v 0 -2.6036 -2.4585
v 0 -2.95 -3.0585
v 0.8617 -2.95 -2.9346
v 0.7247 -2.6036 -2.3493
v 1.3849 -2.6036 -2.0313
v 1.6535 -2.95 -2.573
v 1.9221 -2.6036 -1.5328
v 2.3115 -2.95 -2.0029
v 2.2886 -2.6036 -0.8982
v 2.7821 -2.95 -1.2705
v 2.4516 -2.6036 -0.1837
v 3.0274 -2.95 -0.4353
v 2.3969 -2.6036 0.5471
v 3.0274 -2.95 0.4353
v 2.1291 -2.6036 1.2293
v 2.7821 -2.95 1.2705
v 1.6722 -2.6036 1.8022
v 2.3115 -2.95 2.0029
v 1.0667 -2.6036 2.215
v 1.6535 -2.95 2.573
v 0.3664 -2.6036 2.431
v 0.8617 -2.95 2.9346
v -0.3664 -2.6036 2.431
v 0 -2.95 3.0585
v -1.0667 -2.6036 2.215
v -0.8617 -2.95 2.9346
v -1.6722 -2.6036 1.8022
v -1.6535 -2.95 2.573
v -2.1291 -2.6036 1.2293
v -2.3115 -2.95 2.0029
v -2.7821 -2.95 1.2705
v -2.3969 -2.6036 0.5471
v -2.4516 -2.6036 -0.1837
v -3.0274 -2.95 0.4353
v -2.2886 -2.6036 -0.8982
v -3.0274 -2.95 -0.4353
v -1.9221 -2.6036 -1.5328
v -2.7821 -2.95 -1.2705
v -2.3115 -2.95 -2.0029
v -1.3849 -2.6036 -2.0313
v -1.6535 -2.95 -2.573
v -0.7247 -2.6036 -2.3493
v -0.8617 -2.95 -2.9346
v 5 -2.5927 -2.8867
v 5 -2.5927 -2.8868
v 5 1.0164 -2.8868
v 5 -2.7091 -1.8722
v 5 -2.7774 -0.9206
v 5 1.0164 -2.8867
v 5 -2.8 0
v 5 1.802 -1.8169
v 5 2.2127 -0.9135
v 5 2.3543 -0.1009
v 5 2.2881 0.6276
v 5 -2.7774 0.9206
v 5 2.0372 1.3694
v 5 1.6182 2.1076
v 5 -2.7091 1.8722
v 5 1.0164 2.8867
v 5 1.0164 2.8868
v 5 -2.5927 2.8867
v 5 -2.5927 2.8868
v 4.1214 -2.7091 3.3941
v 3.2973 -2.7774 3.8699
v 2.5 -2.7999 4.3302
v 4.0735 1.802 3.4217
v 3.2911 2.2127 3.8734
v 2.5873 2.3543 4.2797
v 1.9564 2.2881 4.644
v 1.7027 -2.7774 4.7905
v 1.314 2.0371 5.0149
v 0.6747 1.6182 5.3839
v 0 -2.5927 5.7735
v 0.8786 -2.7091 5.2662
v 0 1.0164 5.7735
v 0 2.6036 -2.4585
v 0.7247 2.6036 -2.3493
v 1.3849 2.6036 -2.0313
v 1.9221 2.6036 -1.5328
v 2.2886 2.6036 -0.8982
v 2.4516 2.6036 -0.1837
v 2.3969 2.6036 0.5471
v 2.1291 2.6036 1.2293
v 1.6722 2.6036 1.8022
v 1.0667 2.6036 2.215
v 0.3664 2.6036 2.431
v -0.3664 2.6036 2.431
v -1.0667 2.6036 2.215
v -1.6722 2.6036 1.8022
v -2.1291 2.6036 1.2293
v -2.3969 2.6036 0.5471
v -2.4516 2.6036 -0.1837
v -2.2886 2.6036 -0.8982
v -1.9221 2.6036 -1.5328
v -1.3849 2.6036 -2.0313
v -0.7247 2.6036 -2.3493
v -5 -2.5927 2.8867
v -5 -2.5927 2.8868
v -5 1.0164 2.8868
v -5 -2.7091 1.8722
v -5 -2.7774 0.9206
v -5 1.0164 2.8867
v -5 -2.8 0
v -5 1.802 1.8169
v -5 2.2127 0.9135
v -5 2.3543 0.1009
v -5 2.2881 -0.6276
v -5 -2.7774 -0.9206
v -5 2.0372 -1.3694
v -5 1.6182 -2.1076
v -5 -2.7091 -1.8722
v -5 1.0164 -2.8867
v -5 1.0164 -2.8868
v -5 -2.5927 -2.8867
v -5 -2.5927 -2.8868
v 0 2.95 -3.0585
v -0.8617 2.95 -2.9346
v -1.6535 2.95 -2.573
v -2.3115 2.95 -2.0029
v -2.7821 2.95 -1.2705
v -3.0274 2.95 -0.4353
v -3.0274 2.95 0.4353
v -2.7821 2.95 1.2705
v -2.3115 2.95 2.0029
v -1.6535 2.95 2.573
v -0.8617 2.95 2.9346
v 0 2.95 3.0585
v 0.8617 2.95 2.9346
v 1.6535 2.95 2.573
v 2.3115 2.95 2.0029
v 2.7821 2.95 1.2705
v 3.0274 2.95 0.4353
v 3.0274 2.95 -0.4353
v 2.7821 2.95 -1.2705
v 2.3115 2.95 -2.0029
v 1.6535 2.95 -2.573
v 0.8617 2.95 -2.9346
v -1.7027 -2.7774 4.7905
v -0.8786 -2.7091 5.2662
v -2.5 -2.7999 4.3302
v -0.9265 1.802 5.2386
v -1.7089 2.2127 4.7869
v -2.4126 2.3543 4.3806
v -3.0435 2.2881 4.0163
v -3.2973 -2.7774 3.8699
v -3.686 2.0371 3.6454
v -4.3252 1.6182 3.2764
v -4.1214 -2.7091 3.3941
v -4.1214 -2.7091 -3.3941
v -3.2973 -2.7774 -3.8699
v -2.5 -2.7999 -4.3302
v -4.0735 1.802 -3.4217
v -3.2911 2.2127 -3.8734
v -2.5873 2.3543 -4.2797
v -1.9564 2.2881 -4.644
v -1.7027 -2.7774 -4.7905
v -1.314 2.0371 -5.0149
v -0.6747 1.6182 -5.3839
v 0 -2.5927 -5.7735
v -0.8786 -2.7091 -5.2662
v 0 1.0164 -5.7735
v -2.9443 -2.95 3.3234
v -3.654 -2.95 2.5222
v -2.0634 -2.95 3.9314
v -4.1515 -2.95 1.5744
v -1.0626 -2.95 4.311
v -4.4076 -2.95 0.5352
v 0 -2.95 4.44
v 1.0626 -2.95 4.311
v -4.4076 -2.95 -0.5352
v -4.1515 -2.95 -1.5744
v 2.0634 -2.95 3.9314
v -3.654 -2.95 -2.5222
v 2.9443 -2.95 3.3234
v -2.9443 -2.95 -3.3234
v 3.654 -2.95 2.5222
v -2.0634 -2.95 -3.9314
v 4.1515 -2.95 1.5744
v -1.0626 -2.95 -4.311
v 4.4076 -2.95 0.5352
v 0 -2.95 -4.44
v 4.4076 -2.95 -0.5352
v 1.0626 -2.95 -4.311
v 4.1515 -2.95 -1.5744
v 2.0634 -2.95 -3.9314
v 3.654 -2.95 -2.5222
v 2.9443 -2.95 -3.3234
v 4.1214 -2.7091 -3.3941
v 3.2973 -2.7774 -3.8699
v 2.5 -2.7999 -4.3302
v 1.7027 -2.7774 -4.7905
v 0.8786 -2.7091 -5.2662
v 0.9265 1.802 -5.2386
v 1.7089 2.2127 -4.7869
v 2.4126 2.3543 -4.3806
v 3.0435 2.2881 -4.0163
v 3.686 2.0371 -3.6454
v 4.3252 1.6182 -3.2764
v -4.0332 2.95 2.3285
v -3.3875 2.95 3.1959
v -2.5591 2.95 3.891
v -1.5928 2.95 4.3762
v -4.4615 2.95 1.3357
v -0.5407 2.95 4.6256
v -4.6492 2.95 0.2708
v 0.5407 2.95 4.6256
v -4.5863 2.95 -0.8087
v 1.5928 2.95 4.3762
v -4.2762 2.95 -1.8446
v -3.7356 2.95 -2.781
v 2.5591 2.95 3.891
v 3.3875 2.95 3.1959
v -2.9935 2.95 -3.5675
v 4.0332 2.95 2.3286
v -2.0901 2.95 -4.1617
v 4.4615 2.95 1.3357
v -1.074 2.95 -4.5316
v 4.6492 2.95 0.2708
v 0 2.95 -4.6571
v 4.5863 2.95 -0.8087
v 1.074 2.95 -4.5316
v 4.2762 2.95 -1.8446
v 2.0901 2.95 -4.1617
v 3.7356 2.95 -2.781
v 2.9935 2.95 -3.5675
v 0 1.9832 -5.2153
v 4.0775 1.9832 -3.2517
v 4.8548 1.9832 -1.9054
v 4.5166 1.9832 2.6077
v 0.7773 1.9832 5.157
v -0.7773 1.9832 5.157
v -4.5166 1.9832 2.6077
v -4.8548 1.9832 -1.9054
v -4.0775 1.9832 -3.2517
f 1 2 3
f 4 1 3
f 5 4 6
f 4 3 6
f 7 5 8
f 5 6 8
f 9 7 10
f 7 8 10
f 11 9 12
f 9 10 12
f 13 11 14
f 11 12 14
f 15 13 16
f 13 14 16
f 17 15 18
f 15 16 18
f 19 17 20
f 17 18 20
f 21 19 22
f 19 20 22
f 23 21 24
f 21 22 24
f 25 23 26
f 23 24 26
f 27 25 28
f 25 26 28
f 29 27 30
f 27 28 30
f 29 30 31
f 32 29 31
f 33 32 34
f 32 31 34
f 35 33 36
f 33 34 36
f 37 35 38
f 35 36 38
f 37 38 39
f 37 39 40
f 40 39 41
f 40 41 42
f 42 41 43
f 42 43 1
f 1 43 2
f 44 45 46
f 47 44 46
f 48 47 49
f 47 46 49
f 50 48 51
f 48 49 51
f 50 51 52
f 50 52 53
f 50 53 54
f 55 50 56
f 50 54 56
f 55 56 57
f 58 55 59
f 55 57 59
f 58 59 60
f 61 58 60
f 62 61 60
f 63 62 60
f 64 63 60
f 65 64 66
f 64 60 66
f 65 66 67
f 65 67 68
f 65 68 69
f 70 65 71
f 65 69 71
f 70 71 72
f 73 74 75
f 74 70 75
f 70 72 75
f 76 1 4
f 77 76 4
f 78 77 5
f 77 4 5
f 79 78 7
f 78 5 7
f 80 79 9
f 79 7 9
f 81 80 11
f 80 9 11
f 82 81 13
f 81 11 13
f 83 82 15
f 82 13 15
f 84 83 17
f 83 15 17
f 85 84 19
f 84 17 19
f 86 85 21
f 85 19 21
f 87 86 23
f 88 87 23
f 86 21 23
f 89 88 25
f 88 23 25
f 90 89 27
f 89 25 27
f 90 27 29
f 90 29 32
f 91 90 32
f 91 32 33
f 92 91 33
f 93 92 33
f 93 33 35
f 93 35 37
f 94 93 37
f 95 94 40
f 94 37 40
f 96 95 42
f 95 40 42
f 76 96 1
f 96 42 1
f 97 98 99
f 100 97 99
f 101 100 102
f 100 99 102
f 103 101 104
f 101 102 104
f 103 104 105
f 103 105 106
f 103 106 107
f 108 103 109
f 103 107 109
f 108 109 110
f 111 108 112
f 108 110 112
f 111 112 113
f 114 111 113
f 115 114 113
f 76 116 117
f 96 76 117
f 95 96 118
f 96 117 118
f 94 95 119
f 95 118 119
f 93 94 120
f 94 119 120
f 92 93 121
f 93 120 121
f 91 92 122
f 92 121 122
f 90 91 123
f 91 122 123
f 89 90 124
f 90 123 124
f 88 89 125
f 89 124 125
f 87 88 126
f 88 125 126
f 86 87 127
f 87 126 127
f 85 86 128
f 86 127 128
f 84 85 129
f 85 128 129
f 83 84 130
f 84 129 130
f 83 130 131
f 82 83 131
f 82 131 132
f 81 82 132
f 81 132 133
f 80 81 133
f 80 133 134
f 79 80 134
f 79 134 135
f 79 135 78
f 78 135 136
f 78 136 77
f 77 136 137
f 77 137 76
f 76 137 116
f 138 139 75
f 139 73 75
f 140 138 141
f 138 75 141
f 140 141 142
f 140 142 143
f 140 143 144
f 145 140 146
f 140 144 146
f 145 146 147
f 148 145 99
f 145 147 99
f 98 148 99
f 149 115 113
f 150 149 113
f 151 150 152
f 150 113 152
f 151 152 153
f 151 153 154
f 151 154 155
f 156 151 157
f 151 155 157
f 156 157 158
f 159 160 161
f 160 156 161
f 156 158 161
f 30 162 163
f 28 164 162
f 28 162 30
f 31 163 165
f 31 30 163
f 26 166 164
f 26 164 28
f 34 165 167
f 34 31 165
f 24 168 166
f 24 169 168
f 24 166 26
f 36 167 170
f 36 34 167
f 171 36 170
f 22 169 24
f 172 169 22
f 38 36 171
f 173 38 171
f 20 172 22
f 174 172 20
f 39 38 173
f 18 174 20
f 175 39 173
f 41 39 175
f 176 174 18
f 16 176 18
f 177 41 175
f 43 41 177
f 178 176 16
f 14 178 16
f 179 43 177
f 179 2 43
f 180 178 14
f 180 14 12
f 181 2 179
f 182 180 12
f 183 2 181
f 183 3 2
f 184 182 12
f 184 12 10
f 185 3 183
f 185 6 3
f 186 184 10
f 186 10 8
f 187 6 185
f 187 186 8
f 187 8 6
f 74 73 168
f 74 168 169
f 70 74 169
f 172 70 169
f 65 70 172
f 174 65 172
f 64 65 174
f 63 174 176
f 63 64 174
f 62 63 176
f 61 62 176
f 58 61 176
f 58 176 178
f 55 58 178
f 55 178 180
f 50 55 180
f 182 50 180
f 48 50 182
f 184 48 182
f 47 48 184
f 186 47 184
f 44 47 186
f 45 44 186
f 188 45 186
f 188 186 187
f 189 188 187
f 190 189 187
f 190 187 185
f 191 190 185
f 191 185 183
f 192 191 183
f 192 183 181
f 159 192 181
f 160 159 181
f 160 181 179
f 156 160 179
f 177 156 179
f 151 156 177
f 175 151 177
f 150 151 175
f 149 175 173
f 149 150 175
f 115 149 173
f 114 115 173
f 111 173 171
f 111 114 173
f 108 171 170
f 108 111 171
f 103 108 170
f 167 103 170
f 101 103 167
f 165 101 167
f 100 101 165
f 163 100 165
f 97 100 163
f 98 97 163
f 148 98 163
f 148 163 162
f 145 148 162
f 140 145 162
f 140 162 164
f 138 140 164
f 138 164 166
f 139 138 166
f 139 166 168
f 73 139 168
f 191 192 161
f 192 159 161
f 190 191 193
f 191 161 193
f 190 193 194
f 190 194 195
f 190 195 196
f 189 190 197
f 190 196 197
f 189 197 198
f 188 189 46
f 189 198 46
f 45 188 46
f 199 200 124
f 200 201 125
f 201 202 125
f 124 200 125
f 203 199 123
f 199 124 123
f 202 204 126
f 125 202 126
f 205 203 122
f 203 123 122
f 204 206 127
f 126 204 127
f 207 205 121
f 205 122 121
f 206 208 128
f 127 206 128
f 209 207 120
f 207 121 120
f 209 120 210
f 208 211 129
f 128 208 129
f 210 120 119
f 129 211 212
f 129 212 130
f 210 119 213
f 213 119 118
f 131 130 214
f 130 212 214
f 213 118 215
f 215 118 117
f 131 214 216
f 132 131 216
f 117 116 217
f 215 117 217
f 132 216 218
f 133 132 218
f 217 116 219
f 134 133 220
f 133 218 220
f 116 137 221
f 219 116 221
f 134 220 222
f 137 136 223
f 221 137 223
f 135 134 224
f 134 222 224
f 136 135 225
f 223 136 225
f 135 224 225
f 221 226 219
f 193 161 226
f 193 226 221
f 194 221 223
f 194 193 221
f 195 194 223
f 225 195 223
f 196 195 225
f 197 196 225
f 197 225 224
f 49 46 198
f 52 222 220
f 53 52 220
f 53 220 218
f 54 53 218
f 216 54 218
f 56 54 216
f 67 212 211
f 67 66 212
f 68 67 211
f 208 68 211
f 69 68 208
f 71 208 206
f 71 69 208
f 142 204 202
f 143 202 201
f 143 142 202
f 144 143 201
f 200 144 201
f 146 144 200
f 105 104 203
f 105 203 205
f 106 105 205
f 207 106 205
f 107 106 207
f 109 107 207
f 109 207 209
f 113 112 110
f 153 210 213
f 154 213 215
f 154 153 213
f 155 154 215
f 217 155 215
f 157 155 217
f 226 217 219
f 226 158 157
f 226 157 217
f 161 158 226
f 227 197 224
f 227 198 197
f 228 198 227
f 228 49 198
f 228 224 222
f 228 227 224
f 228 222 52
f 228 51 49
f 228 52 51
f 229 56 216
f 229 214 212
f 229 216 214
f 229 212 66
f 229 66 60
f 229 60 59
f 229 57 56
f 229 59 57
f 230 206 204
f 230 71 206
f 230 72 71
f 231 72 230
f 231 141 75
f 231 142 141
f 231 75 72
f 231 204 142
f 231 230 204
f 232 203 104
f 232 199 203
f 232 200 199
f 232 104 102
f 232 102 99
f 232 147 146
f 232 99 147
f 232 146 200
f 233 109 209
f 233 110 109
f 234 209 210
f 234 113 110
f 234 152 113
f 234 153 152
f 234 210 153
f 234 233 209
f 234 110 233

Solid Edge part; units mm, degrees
sketch "Sketch1" plane through (0, 0, 0) normal (0, -1, 0) x (1, 0, 0)
  line L0 (5, 2.8868) -> (0, 5.7735)
  line L1 (0, 5.7735) -> (-5, 2.8868)
  line L2 (-5, 2.8868) -> (-5, -2.8868)
  line L3 (-5, -2.8868) -> (0, -5.7735)
  line L4 (0, -5.7735) -> (5, -2.8868)
  line L5 (5, -2.8868) -> (5, 2.8868)
extrude "Protrusion1" add sketch "Sketch1" along normal mid plane 5.9
sketch "Sketch2" plane through (0, 0, 0) normal (1, 0, 0) x (0, 1, 0)
  line L0 (-2.95, 4.44) -> (-2.5927, 5.7735)
revolve "RevolvedCutout1" cut sketch "Sketch2" angle 360 about axis through (0, 0, 0) along (0, -1, 0) material side at (0, -2.8196, 5.1197)
hole "孔_7" at (0, -2.95, 0) direction (0, 1, 0) diameter 4.917 end up to next start chamfer 0.6 start chamfer angle 60 end chamfer 0.6 end chamfer angle 60
sketch "Sketch3" plane through (0, 0, 0) normal (1, 0, 0) x (0, 1, 0)
  line L0 (2.95, -4.6571) -> (1.0164, -5.7735)
revolve "RevolvedCutout2" cut sketch "Sketch3" angle 360 about axis through (0, 0, 0) along (0, 1, 0) material side at (0, 2.0082, -5.2586)
properties part number "N2531-"
